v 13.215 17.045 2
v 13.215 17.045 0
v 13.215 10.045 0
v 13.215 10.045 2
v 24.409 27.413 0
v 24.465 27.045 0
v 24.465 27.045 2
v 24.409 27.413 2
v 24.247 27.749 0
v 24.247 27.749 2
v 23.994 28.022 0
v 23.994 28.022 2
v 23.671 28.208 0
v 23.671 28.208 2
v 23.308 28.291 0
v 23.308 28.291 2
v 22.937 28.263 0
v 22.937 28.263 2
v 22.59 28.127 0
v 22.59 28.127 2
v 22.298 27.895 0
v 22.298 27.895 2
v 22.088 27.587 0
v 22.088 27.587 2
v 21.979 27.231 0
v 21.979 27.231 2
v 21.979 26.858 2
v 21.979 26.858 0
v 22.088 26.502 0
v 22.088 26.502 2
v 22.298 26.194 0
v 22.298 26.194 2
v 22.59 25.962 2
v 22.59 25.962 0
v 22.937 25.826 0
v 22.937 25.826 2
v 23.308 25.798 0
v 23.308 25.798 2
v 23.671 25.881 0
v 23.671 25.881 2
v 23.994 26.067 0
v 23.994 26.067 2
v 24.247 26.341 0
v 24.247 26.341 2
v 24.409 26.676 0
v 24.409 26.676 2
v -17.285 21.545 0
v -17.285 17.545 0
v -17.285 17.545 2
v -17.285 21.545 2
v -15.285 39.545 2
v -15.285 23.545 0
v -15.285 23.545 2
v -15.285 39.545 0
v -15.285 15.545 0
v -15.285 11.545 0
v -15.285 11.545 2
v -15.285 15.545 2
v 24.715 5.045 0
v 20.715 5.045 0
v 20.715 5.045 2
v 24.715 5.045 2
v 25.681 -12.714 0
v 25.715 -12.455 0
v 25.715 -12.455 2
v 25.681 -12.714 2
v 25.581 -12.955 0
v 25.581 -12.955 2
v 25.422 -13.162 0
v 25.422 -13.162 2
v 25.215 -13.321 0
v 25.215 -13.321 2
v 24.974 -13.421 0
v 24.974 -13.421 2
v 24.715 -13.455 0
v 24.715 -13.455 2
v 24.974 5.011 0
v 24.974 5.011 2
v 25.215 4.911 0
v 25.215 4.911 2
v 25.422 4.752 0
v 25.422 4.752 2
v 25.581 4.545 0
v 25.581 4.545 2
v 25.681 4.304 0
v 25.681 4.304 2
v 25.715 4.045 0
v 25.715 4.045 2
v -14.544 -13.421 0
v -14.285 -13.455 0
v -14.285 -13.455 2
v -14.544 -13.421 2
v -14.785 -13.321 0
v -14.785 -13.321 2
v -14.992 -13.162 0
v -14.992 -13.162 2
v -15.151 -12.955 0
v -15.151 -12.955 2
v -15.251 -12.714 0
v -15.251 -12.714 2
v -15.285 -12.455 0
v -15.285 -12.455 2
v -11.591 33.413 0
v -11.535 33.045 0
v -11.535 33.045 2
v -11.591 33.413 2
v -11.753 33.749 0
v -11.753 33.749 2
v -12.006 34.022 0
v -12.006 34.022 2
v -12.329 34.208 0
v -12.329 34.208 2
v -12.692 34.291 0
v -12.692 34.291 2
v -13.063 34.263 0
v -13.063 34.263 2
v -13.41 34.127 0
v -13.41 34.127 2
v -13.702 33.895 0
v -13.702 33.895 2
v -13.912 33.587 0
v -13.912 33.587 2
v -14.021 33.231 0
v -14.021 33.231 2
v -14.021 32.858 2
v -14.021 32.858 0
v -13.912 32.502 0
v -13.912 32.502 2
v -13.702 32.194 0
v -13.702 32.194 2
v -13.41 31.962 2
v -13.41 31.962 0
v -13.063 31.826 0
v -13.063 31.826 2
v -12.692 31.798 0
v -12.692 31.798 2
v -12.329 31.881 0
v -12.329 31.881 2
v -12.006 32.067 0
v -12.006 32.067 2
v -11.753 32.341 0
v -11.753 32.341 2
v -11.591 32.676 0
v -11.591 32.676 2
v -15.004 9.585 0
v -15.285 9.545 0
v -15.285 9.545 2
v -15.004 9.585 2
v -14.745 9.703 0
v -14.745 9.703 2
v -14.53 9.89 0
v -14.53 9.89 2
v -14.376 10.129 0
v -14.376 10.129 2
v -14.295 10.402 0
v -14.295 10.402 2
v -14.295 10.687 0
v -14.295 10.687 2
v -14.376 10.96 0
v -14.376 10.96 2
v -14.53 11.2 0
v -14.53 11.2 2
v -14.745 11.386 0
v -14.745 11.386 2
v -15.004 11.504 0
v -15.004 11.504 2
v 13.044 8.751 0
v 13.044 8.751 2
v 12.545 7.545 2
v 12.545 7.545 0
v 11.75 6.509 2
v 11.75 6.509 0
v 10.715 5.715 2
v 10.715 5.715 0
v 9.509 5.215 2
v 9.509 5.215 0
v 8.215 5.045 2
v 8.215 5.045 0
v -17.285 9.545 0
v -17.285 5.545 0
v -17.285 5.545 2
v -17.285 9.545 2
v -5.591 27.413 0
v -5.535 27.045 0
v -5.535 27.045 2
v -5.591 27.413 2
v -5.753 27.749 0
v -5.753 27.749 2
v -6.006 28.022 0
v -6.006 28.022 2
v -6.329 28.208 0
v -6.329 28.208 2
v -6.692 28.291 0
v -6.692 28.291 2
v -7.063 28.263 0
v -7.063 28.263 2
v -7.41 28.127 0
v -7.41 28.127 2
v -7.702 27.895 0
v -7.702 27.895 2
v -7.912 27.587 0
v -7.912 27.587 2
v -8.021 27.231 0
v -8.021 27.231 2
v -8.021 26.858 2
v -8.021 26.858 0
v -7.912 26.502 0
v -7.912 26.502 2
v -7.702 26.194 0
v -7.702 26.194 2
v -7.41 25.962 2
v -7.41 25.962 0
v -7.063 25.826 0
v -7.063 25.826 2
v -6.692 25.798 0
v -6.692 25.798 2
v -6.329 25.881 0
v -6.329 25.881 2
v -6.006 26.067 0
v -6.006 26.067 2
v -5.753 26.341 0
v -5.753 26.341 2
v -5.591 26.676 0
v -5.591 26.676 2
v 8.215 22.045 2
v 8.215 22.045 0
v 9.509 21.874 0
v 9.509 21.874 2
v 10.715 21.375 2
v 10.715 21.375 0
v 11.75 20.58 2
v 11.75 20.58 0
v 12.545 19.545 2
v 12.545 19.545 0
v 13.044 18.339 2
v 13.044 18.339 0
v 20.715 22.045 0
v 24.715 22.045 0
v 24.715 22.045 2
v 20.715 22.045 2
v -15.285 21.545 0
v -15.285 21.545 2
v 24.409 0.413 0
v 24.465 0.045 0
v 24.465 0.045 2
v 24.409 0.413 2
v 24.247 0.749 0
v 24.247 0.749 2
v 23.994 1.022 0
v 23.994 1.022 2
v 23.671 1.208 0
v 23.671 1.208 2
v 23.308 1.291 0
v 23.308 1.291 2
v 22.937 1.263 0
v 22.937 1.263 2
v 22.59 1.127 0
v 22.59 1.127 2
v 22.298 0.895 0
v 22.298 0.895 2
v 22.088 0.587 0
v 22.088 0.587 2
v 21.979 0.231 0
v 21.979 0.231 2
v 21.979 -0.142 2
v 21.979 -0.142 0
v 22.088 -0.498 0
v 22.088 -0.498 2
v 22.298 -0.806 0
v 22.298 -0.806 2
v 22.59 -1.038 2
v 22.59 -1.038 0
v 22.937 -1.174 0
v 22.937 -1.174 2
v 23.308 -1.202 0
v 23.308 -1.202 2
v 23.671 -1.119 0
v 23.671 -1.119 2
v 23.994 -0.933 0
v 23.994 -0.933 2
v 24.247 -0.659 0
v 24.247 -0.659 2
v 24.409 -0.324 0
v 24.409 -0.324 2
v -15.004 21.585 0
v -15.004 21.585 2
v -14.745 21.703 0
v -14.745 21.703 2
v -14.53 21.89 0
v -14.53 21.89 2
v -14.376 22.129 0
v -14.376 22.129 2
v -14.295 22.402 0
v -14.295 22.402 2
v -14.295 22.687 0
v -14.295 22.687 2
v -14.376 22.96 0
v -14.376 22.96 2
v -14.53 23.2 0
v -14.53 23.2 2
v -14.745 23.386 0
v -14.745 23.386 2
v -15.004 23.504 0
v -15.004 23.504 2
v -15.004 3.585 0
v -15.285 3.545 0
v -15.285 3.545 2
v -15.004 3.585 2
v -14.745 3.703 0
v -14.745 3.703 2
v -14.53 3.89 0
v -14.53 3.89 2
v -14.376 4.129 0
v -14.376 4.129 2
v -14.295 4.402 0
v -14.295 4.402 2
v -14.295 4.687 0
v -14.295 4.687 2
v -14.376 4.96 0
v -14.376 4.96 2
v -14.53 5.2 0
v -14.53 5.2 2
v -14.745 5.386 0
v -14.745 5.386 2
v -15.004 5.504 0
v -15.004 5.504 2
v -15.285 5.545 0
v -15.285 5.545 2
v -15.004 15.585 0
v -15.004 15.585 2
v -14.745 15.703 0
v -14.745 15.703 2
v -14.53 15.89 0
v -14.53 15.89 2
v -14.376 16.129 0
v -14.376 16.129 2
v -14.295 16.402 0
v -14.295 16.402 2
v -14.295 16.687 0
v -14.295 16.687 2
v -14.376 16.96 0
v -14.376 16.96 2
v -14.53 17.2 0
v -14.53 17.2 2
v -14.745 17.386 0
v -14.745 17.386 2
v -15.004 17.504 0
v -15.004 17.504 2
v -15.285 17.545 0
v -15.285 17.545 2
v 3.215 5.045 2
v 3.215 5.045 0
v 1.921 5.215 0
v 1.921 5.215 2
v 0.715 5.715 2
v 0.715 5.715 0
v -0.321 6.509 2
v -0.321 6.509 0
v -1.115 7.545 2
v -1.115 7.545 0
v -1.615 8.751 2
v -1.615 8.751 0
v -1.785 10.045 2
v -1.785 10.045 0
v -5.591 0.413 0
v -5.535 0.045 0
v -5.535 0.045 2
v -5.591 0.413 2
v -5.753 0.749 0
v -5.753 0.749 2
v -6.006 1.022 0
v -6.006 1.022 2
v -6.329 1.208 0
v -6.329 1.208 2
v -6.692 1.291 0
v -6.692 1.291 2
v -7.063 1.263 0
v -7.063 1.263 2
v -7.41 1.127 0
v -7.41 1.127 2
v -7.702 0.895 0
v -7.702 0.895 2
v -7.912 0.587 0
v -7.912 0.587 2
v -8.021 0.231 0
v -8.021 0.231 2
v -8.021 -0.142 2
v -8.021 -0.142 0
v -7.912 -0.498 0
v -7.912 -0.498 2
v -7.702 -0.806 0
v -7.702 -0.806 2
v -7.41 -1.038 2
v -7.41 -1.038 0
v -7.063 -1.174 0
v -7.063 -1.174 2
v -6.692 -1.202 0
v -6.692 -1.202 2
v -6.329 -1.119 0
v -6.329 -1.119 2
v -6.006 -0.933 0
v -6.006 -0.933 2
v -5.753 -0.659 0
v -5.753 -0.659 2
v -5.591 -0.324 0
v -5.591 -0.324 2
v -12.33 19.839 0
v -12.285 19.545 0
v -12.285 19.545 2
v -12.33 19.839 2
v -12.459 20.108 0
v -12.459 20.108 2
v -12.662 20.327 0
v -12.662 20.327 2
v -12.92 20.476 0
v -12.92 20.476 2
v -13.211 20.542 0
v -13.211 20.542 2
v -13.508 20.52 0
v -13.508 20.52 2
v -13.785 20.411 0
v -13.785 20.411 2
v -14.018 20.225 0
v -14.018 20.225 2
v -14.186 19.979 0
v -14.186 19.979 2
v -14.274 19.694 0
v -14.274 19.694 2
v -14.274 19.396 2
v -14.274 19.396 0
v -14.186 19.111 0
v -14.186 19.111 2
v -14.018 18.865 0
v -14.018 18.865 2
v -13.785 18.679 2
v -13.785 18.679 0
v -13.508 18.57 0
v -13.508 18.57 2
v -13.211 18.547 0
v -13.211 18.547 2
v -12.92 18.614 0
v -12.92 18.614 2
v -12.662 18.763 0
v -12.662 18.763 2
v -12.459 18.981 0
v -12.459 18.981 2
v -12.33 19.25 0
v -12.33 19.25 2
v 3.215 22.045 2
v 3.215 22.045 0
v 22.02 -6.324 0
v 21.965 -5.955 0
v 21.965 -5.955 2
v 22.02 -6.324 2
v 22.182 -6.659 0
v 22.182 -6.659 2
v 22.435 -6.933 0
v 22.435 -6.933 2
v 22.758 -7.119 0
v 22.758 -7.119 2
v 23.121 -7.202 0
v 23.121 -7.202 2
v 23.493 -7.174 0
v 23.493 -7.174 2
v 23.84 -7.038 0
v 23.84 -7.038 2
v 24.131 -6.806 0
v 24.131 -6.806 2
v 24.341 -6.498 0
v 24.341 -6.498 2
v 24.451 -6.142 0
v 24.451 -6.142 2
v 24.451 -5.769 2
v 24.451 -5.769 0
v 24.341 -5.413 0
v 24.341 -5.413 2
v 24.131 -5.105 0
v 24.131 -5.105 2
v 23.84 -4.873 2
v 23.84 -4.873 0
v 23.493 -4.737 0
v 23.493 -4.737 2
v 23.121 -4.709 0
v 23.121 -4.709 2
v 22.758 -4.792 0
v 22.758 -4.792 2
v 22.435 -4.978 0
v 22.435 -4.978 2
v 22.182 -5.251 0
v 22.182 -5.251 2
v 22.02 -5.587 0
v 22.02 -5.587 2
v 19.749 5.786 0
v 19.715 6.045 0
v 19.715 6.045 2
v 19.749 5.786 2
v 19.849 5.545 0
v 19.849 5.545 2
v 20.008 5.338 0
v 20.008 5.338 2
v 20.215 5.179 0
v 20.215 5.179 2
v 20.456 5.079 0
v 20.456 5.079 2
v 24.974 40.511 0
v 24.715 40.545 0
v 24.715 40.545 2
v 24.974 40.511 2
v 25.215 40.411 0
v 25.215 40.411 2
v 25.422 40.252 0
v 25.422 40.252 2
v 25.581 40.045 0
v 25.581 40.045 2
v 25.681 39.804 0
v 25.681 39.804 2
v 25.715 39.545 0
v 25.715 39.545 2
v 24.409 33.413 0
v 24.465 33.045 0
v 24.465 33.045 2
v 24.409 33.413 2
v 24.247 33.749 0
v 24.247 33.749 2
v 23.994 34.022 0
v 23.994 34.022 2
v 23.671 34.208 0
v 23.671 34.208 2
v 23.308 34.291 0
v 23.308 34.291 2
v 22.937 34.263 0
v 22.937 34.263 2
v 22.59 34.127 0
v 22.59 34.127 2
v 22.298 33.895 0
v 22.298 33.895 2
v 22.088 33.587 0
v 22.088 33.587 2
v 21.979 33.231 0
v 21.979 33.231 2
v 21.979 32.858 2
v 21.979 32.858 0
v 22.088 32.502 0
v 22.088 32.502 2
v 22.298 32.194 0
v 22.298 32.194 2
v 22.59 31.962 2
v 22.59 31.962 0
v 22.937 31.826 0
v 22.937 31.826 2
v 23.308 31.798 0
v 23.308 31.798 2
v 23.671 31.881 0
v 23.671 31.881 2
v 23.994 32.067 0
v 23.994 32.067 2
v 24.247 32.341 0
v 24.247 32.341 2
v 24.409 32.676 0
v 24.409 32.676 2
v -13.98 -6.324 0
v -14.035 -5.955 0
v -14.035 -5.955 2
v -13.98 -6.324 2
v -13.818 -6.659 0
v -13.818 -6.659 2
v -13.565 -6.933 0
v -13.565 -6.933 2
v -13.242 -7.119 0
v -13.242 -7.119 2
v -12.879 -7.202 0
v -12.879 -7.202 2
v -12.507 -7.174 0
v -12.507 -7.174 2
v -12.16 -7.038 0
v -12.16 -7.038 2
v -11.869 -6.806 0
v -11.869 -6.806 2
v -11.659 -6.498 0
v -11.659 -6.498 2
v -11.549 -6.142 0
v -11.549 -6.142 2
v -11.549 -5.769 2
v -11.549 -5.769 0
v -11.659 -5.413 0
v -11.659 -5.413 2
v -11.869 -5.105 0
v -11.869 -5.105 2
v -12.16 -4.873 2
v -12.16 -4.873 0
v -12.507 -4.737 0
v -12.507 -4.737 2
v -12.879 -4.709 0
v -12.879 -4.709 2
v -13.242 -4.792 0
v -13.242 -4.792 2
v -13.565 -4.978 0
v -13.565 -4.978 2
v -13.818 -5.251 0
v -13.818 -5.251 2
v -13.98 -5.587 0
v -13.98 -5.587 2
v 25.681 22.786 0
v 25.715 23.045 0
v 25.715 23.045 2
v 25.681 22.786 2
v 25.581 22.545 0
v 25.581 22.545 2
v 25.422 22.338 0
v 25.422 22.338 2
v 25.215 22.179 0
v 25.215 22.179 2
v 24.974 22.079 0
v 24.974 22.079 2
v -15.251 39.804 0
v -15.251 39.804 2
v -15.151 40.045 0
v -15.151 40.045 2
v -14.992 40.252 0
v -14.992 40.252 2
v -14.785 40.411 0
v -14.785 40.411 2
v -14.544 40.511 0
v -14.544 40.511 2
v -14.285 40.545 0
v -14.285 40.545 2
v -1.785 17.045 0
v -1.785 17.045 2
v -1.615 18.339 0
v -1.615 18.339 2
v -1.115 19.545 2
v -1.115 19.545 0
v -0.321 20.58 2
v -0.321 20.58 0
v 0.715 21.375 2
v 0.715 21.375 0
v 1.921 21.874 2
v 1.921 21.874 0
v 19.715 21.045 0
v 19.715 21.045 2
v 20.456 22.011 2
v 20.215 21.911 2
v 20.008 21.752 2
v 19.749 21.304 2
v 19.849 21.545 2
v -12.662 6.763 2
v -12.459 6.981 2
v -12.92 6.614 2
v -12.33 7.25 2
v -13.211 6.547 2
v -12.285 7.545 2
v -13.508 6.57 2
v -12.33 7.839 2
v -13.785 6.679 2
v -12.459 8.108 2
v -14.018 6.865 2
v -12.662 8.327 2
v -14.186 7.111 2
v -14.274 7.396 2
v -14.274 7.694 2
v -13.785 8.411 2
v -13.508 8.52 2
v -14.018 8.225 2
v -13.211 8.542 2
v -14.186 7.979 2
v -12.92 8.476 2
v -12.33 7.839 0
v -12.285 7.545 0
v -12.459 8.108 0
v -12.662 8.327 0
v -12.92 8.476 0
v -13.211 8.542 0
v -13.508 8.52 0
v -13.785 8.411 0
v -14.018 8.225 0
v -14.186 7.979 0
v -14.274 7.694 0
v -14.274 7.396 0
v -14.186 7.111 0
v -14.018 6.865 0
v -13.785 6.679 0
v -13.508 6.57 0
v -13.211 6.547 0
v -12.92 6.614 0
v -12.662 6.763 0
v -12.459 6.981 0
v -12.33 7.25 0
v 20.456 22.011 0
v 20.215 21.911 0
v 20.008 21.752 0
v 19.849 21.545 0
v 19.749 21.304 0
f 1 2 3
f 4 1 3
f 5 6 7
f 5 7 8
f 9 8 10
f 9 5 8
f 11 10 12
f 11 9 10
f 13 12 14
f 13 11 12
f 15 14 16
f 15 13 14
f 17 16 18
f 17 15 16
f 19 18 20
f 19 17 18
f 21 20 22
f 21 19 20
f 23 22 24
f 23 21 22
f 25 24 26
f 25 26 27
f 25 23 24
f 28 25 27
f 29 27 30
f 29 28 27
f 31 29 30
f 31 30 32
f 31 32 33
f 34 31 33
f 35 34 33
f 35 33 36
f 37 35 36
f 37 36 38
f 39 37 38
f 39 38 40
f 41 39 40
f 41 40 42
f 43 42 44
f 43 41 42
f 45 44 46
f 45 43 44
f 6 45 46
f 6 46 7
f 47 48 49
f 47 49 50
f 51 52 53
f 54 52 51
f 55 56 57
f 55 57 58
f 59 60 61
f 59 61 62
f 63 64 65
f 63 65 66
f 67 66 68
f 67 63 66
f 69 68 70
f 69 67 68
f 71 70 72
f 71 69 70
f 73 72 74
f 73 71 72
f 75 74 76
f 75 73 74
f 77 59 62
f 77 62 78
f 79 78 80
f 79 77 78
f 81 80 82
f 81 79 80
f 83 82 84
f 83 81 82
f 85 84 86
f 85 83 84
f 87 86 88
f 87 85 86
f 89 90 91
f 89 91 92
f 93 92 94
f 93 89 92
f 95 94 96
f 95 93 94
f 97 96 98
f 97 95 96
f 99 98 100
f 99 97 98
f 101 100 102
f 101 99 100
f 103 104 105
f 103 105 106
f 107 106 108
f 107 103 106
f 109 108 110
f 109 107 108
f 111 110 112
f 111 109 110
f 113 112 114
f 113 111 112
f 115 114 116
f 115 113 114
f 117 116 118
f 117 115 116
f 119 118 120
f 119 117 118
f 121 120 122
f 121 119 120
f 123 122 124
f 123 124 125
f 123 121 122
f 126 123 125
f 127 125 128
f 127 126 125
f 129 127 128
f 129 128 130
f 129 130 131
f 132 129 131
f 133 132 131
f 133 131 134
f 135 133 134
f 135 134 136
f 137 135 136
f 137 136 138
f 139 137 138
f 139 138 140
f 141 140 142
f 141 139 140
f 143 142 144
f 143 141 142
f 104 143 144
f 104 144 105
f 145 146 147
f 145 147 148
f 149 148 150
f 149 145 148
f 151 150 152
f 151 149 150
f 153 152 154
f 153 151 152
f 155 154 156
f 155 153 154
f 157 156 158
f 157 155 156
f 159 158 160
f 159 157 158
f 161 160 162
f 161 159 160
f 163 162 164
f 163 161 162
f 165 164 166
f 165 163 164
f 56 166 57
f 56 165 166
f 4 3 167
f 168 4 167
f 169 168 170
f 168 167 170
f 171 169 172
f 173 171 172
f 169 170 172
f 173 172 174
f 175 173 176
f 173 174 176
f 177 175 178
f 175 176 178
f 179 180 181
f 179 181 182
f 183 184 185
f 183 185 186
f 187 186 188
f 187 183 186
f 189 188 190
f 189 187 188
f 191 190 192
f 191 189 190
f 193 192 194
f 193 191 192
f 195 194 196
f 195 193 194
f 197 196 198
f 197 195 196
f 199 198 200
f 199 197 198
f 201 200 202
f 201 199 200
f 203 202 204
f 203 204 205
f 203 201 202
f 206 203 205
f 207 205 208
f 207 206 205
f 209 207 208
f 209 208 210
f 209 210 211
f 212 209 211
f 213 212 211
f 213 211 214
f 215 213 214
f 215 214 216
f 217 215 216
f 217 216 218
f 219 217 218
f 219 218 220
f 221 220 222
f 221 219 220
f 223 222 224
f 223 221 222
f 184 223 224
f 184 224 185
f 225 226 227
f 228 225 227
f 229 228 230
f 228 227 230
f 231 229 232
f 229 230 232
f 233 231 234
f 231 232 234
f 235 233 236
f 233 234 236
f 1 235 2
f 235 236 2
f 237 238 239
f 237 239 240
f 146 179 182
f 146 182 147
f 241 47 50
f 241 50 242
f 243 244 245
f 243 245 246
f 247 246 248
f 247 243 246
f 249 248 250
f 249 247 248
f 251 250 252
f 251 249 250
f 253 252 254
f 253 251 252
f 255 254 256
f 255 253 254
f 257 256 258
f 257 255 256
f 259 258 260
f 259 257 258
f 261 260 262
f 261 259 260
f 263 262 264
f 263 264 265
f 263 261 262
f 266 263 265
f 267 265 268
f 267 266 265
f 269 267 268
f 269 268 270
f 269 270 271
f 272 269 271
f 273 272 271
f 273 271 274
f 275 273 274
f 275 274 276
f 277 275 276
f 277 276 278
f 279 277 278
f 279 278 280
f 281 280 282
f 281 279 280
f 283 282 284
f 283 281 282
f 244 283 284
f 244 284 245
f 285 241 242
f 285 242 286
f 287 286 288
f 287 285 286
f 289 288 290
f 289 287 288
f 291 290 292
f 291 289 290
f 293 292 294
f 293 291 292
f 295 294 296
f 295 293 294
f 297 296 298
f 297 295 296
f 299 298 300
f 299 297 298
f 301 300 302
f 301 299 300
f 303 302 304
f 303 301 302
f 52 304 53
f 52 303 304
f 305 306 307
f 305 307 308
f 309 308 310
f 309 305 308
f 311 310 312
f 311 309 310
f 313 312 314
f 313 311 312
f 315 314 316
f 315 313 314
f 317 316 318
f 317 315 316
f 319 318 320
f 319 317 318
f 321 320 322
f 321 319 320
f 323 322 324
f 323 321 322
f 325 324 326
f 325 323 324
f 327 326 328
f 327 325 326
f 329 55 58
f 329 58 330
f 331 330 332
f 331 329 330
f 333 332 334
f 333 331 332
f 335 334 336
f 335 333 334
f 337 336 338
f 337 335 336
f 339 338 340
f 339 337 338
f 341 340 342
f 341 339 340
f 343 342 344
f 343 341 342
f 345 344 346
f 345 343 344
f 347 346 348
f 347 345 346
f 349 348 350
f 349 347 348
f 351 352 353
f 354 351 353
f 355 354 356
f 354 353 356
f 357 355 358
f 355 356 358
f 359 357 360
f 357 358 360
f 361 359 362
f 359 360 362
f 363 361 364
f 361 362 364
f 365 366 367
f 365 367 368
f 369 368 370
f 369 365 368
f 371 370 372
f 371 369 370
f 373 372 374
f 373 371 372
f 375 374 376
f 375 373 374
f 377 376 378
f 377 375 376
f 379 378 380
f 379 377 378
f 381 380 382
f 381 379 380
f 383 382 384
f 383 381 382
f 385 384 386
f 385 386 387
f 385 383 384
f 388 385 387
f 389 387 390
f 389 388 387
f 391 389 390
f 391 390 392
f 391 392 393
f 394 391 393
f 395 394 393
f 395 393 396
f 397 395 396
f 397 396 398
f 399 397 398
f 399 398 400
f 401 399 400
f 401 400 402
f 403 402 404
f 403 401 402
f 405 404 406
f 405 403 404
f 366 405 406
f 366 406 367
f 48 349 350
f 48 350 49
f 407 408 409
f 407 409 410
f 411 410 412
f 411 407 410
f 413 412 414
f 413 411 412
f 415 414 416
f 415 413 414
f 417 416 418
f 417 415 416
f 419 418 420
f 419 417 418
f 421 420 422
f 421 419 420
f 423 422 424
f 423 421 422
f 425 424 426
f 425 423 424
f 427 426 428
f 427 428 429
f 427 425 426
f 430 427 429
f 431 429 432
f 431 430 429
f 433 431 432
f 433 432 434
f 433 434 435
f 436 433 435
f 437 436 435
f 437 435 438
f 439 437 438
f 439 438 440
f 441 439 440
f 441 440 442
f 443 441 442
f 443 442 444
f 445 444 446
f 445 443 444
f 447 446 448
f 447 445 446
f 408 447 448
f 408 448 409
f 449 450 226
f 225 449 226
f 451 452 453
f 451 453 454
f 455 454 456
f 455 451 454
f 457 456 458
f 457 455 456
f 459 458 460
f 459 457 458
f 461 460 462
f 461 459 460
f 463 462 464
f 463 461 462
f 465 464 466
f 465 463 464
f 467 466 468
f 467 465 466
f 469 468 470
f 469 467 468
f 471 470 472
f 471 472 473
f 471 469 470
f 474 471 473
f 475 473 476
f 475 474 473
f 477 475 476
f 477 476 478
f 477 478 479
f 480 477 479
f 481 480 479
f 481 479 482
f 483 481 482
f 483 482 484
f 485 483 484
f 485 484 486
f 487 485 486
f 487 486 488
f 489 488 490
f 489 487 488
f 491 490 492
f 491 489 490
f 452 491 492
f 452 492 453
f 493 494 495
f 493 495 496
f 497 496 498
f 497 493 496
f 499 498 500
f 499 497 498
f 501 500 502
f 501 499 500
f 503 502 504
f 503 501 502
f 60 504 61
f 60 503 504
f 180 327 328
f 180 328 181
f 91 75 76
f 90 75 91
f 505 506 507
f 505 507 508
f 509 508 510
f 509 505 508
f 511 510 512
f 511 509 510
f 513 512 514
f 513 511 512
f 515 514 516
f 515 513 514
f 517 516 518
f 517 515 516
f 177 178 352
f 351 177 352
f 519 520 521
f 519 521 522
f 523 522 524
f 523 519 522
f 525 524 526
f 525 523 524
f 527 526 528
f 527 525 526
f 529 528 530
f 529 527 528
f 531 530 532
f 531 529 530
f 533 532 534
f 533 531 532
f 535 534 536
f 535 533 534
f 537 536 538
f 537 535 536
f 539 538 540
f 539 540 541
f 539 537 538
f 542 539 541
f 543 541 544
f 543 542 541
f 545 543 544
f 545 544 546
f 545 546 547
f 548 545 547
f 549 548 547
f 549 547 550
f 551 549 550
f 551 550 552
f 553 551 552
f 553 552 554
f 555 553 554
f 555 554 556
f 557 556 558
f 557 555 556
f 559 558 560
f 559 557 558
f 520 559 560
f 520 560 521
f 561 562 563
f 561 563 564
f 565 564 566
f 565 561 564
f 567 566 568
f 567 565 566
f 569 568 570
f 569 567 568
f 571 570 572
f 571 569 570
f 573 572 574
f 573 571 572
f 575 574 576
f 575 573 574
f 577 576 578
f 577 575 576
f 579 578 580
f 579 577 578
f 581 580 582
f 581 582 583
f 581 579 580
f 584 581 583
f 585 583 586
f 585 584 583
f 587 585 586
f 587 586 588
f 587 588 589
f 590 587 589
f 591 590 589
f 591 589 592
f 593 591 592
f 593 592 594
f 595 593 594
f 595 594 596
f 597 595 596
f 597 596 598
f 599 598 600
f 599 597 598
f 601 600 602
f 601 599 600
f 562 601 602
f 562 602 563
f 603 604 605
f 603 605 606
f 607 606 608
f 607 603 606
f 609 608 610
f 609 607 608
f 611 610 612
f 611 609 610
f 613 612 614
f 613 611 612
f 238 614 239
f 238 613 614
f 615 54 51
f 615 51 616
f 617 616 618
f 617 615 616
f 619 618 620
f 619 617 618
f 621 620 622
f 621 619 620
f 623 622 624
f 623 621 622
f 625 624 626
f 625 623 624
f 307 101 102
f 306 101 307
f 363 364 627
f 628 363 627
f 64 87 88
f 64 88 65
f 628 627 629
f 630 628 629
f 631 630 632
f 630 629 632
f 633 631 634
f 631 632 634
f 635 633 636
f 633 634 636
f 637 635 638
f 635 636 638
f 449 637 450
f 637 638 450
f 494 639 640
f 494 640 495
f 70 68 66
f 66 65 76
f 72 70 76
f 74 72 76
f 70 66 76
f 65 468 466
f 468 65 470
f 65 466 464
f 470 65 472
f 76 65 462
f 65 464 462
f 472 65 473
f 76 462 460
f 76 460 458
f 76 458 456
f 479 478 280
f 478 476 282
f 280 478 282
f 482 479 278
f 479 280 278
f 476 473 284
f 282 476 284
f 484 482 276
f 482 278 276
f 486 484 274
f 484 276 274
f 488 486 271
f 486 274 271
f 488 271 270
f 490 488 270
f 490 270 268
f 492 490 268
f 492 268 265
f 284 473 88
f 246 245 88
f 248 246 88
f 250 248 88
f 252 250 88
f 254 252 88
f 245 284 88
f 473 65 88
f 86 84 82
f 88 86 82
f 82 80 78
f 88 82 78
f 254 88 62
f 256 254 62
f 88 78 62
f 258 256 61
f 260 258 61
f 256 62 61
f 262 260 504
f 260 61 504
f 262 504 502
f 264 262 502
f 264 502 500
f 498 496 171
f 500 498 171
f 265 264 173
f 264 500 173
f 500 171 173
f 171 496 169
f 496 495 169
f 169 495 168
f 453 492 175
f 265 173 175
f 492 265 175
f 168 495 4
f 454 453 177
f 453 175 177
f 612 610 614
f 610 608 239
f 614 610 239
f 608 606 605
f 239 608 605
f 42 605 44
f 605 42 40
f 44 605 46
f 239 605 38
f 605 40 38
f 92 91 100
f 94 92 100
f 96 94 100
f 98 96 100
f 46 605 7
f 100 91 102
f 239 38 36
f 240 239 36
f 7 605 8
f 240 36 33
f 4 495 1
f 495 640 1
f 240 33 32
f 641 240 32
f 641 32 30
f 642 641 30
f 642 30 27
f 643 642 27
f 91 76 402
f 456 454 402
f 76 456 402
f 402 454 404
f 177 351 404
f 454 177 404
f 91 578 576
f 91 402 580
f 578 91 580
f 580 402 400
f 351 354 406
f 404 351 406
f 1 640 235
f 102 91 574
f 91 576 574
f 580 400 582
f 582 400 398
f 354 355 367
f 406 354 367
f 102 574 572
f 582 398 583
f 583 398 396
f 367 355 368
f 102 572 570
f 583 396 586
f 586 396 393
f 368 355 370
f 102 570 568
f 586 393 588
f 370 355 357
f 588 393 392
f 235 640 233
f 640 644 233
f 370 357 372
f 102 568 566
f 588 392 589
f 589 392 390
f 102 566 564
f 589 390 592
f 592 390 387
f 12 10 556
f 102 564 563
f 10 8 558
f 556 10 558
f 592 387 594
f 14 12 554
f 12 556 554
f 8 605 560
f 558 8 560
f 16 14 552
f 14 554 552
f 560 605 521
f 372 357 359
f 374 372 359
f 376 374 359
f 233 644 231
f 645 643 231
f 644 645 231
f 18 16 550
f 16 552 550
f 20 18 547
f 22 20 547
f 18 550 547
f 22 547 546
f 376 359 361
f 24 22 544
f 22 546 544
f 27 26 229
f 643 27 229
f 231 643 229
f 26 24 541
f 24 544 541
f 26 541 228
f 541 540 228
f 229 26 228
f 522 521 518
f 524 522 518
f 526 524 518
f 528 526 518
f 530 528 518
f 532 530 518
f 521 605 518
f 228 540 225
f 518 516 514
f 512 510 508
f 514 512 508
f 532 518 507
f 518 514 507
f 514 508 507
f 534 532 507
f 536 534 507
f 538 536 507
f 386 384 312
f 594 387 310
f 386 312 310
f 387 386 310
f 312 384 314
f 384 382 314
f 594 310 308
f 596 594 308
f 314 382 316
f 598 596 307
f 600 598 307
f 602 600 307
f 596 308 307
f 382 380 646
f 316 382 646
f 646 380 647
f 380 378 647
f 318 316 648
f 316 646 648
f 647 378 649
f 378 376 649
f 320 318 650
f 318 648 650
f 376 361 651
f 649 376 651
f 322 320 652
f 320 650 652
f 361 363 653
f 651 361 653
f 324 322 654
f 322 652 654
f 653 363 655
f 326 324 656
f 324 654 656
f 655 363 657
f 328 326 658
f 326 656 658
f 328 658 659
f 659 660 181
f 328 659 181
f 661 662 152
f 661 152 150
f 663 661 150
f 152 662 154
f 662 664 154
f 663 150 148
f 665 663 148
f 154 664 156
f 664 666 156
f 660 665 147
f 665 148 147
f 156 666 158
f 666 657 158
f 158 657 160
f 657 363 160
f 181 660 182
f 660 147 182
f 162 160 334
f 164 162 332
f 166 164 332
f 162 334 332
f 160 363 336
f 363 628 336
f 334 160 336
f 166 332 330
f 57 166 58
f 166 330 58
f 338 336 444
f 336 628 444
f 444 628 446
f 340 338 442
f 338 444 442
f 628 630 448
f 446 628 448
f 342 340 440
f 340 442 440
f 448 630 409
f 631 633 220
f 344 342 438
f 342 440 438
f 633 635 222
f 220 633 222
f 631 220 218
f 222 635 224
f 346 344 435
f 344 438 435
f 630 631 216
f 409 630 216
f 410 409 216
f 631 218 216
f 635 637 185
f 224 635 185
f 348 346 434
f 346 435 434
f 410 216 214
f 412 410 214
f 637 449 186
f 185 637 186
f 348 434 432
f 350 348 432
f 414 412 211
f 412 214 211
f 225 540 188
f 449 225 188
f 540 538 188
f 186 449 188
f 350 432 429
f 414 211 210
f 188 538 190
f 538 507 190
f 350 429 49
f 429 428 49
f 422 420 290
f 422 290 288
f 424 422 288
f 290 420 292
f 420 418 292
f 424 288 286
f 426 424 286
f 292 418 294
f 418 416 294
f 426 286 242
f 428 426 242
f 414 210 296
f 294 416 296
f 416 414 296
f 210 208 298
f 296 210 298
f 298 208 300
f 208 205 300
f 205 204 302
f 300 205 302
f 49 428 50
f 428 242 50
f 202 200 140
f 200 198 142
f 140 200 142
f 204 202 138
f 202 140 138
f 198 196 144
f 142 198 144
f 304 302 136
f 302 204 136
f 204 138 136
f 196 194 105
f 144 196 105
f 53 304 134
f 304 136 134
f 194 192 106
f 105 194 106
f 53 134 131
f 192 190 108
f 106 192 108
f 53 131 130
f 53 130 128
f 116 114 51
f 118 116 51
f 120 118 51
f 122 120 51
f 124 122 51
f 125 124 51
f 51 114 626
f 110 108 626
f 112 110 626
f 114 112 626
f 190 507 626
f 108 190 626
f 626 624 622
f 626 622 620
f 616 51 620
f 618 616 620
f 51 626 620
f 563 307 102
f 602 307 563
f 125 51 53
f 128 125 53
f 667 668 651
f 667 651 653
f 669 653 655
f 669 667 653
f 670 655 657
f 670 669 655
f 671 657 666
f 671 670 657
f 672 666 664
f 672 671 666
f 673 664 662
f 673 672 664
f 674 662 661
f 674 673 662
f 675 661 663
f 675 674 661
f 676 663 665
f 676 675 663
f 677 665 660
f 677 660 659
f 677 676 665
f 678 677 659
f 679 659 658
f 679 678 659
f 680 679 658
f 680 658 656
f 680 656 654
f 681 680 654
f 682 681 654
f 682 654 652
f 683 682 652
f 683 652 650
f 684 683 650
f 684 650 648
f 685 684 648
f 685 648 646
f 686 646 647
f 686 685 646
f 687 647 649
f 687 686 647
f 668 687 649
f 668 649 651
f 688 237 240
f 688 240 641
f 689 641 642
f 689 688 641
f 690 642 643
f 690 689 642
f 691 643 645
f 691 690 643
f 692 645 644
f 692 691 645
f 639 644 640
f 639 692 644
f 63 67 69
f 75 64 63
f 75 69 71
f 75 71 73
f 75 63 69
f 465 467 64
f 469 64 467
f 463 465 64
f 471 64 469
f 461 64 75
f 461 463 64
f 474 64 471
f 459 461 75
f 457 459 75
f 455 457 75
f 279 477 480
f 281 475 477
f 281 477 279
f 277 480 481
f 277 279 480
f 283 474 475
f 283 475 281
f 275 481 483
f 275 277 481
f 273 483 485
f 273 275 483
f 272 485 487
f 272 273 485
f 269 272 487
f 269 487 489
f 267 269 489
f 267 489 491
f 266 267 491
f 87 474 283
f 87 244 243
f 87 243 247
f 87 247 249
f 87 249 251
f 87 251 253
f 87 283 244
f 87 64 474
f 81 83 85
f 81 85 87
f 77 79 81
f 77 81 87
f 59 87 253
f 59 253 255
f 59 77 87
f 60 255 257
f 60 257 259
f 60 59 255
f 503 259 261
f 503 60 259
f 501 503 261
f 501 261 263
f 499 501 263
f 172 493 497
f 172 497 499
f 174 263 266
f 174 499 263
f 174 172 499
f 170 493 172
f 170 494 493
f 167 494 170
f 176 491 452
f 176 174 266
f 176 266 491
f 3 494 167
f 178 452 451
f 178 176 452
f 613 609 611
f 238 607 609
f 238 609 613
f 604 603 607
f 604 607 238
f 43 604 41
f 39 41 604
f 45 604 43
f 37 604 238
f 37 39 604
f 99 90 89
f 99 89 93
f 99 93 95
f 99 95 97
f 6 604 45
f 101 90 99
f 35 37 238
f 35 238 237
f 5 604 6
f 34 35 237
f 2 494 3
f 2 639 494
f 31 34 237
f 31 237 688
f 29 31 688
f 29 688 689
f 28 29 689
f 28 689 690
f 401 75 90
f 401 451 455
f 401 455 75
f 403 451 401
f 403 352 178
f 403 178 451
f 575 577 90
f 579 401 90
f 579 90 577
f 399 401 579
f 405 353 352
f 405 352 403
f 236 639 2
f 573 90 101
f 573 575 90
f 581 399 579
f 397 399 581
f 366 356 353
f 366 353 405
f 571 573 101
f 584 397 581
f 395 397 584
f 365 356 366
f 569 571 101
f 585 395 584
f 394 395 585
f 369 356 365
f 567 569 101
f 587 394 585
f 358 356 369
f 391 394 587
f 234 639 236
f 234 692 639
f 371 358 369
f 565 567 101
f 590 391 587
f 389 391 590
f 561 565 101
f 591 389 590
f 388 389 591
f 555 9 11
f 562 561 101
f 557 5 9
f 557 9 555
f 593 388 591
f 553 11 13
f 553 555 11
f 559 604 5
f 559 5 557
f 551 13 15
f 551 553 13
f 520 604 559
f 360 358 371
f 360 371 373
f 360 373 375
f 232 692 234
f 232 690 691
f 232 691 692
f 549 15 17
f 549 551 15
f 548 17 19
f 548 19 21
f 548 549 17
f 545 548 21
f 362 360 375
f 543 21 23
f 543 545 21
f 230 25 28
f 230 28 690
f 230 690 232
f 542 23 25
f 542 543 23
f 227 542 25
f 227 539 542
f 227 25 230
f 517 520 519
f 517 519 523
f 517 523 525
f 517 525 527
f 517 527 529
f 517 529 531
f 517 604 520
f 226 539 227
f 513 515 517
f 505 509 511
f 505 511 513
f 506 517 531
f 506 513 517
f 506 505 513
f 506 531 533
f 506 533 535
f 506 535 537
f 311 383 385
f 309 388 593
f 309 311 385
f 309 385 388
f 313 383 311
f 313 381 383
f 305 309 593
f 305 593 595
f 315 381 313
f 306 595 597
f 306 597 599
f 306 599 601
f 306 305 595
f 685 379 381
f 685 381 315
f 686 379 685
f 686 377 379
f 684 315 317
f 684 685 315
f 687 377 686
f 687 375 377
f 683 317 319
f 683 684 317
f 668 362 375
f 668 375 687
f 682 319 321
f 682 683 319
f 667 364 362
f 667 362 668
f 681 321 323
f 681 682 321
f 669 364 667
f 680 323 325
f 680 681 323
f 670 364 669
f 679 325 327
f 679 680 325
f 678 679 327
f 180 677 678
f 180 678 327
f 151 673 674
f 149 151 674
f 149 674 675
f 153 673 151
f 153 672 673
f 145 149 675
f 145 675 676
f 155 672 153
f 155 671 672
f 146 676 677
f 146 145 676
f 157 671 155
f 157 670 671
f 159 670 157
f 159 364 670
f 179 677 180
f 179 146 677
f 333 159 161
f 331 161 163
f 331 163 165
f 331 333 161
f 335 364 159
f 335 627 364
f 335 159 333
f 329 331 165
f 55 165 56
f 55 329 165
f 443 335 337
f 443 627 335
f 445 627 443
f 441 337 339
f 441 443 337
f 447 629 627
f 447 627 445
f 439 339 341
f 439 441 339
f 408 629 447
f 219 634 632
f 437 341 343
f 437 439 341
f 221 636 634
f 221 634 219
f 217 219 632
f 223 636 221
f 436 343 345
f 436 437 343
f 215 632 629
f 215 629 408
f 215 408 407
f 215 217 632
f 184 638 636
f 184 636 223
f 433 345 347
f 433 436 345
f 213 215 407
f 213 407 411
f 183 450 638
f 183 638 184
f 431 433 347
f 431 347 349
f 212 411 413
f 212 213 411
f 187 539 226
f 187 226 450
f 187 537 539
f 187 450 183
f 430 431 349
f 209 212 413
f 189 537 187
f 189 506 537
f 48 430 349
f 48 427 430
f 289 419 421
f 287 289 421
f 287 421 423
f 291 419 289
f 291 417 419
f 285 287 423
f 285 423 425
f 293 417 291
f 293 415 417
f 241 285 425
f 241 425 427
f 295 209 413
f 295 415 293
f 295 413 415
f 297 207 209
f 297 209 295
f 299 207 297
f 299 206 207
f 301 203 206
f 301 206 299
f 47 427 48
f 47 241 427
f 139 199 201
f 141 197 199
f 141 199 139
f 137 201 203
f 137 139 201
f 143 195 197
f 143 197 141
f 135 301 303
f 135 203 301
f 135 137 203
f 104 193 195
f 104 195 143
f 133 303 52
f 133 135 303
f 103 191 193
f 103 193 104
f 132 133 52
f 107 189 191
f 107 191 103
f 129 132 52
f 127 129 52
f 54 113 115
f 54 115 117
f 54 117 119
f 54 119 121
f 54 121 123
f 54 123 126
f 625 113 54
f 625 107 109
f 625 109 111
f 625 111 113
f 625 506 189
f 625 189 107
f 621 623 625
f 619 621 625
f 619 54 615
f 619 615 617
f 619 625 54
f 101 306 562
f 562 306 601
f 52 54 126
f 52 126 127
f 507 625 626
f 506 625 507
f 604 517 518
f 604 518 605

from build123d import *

# Parameters (mm, degrees)
SKETCH_1_R      = 1.25
SKETCH_1_R_2    = 1
EXTRUDE_1_DEPTH = 2


with BuildPart() as part:
    # 草圖1 → 填料-伸長1 (new body)
    with BuildSketch(Plane.XY):
        with BuildLine():
            Line((25.714690816, 4.04468624), (25.714690816, -0.95531376))
            Line((25.714690816, -0.95531376), (25.714690816, -12.45531376))
            ThreePointArc((25.714690816, -12.45531376), (25.421797597, -13.162420542), (24.714690816, -13.45531376))
            Line((24.714690816, -13.45531376), (-14.285309184, -13.45531376))
            ThreePointArc((-14.285309184, -13.45531376), (-14.992415965, -13.162420542), (-15.285309184, -12.45531376))
            Line((-15.285309184, -12.45531376), (-15.285309184, 3.54468624))
            ThreePointArc((-15.285309184, 3.54468624), (-14.285309184, 4.54468624), (-15.285309184, 5.54468624))
            Line((-15.285309184, 5.54468624), (-17.285309184, 5.54468624))
            Line((-17.285309184, 5.54468624), (-17.285309184, 9.54468624))
            Line((-17.285309184, 9.54468624), (-15.285309184, 9.54468624))
            ThreePointArc((-15.285309184, 9.54468624), (-14.285309184, 10.54468624), (-15.285309184, 11.54468624))
            Line((-15.285309184, 11.54468624), (-15.285309184, 15.54468624))
            ThreePointArc((-15.285309184, 15.54468624), (-14.285309184, 16.54468624), (-15.285309184, 17.54468624))
            Line((-15.285309184, 17.54468624), (-17.285309184, 17.54468624))
            Line((-17.285309184, 17.54468624), (-17.285309184, 21.54468624))
            Line((-17.285309184, 21.54468624), (-15.285309184, 21.54468624))
            ThreePointArc((-15.285309184, 21.54468624), (-14.285309184, 22.54468624), (-15.285309184, 23.54468624))
            Line((-15.285309184, 23.54468624), (-15.285309184, 39.54468624))
            ThreePointArc((-15.285309184, 39.54468624), (-14.992415965, 40.251793021), (-14.285309184, 40.54468624))
            Line((-14.285309184, 40.54468624), (24.714690816, 40.54468624))
            ThreePointArc((24.714690816, 40.54468624), (25.421797597, 40.251793021), (25.714690816, 39.54468624))
            Line((25.714690816, 39.54468624), (25.714690816, 28.54468624))
            Line((25.714690816, 28.54468624), (25.714690816, 23.04468624))
            ThreePointArc((25.714690816, 23.04468624), (25.421797597, 22.337579458), (24.714690816, 22.04468624))
            Line((24.714690816, 22.04468624), (20.714690816, 22.04468624))
            ThreePointArc((20.714690816, 22.04468624), (20.007584035, 21.751793021), (19.714690816, 21.04468624))
            Line((19.714690816, 21.04468624), (19.714690816, 6.04468624))
            ThreePointArc((19.714690816, 6.04468624), (20.007584035, 5.337579458), (20.714690816, 5.04468624))
            Line((20.714690816, 5.04468624), (24.714690816, 5.04468624))
            ThreePointArc((24.714690816, 5.04468624), (25.421797597, 4.751793021), (25.714690816, 4.04468624))
        make_face()
        with Locations((-6.785309184, 27.04468624)):
            Circle(SKETCH_1_R, mode=Mode.SUBTRACT)
        with Locations((23.214690816, 27.04468624)):
            Circle(SKETCH_1_R, mode=Mode.SUBTRACT)
        with Locations((-6.785309184, 0.04468624)):
            Circle(SKETCH_1_R, mode=Mode.SUBTRACT)
        with Locations((23.214690816, 0.04468624)):
            Circle(SKETCH_1_R, mode=Mode.SUBTRACT)
        with Locations((-12.785309184, 33.04468624)):
            Circle(SKETCH_1_R, mode=Mode.SUBTRACT)
        with Locations((23.214690816, 33.04468624)):
            Circle(SKETCH_1_R, mode=Mode.SUBTRACT)
        with Locations(Location((23.214690816, -5.95531376, 0), (0, 0, 180))):
            Circle(SKETCH_1_R, mode=Mode.SUBTRACT)
        with Locations(Location((-12.785309184, -5.95531376, 0), (0, 0, 180))):
            Circle(SKETCH_1_R, mode=Mode.SUBTRACT)
        with Locations((-13.285309184, 19.54468624)):
            Circle(SKETCH_1_R_2, mode=Mode.SUBTRACT)
        with Locations((-13.285309184, 7.54468624)):
            Circle(SKETCH_1_R_2, mode=Mode.SUBTRACT)
        with BuildLine():
            Line((3.214690816, 22.04468624), (8.214690816, 22.04468624))
            ThreePointArc((8.214690816, 22.04468624), (11.750224722, 20.580220146), (13.214690816, 17.04468624))
            Line((13.214690816, 17.04468624), (13.214690816, 10.04468624))
            ThreePointArc((13.214690816, 10.04468624), (11.750224722, 6.509152334), (8.214690816, 5.04468624))
            Line((8.214690816, 5.04468624), (3.214690816, 5.04468624))
            ThreePointArc((3.214690816, 5.04468624), (-0.32084309, 6.509152334), (-1.785309184, 10.04468624))
            Line((-1.785309184, 10.04468624), (-1.785309184, 17.04468624))
            ThreePointArc((-1.785309184, 17.04468624), (-0.32084309, 20.580220146), (3.214690816, 22.04468624))
        make_face(mode=Mode.SUBTRACT)
    extrude(amount=EXTRUDE_1_DEPTH)


solid = part.part
